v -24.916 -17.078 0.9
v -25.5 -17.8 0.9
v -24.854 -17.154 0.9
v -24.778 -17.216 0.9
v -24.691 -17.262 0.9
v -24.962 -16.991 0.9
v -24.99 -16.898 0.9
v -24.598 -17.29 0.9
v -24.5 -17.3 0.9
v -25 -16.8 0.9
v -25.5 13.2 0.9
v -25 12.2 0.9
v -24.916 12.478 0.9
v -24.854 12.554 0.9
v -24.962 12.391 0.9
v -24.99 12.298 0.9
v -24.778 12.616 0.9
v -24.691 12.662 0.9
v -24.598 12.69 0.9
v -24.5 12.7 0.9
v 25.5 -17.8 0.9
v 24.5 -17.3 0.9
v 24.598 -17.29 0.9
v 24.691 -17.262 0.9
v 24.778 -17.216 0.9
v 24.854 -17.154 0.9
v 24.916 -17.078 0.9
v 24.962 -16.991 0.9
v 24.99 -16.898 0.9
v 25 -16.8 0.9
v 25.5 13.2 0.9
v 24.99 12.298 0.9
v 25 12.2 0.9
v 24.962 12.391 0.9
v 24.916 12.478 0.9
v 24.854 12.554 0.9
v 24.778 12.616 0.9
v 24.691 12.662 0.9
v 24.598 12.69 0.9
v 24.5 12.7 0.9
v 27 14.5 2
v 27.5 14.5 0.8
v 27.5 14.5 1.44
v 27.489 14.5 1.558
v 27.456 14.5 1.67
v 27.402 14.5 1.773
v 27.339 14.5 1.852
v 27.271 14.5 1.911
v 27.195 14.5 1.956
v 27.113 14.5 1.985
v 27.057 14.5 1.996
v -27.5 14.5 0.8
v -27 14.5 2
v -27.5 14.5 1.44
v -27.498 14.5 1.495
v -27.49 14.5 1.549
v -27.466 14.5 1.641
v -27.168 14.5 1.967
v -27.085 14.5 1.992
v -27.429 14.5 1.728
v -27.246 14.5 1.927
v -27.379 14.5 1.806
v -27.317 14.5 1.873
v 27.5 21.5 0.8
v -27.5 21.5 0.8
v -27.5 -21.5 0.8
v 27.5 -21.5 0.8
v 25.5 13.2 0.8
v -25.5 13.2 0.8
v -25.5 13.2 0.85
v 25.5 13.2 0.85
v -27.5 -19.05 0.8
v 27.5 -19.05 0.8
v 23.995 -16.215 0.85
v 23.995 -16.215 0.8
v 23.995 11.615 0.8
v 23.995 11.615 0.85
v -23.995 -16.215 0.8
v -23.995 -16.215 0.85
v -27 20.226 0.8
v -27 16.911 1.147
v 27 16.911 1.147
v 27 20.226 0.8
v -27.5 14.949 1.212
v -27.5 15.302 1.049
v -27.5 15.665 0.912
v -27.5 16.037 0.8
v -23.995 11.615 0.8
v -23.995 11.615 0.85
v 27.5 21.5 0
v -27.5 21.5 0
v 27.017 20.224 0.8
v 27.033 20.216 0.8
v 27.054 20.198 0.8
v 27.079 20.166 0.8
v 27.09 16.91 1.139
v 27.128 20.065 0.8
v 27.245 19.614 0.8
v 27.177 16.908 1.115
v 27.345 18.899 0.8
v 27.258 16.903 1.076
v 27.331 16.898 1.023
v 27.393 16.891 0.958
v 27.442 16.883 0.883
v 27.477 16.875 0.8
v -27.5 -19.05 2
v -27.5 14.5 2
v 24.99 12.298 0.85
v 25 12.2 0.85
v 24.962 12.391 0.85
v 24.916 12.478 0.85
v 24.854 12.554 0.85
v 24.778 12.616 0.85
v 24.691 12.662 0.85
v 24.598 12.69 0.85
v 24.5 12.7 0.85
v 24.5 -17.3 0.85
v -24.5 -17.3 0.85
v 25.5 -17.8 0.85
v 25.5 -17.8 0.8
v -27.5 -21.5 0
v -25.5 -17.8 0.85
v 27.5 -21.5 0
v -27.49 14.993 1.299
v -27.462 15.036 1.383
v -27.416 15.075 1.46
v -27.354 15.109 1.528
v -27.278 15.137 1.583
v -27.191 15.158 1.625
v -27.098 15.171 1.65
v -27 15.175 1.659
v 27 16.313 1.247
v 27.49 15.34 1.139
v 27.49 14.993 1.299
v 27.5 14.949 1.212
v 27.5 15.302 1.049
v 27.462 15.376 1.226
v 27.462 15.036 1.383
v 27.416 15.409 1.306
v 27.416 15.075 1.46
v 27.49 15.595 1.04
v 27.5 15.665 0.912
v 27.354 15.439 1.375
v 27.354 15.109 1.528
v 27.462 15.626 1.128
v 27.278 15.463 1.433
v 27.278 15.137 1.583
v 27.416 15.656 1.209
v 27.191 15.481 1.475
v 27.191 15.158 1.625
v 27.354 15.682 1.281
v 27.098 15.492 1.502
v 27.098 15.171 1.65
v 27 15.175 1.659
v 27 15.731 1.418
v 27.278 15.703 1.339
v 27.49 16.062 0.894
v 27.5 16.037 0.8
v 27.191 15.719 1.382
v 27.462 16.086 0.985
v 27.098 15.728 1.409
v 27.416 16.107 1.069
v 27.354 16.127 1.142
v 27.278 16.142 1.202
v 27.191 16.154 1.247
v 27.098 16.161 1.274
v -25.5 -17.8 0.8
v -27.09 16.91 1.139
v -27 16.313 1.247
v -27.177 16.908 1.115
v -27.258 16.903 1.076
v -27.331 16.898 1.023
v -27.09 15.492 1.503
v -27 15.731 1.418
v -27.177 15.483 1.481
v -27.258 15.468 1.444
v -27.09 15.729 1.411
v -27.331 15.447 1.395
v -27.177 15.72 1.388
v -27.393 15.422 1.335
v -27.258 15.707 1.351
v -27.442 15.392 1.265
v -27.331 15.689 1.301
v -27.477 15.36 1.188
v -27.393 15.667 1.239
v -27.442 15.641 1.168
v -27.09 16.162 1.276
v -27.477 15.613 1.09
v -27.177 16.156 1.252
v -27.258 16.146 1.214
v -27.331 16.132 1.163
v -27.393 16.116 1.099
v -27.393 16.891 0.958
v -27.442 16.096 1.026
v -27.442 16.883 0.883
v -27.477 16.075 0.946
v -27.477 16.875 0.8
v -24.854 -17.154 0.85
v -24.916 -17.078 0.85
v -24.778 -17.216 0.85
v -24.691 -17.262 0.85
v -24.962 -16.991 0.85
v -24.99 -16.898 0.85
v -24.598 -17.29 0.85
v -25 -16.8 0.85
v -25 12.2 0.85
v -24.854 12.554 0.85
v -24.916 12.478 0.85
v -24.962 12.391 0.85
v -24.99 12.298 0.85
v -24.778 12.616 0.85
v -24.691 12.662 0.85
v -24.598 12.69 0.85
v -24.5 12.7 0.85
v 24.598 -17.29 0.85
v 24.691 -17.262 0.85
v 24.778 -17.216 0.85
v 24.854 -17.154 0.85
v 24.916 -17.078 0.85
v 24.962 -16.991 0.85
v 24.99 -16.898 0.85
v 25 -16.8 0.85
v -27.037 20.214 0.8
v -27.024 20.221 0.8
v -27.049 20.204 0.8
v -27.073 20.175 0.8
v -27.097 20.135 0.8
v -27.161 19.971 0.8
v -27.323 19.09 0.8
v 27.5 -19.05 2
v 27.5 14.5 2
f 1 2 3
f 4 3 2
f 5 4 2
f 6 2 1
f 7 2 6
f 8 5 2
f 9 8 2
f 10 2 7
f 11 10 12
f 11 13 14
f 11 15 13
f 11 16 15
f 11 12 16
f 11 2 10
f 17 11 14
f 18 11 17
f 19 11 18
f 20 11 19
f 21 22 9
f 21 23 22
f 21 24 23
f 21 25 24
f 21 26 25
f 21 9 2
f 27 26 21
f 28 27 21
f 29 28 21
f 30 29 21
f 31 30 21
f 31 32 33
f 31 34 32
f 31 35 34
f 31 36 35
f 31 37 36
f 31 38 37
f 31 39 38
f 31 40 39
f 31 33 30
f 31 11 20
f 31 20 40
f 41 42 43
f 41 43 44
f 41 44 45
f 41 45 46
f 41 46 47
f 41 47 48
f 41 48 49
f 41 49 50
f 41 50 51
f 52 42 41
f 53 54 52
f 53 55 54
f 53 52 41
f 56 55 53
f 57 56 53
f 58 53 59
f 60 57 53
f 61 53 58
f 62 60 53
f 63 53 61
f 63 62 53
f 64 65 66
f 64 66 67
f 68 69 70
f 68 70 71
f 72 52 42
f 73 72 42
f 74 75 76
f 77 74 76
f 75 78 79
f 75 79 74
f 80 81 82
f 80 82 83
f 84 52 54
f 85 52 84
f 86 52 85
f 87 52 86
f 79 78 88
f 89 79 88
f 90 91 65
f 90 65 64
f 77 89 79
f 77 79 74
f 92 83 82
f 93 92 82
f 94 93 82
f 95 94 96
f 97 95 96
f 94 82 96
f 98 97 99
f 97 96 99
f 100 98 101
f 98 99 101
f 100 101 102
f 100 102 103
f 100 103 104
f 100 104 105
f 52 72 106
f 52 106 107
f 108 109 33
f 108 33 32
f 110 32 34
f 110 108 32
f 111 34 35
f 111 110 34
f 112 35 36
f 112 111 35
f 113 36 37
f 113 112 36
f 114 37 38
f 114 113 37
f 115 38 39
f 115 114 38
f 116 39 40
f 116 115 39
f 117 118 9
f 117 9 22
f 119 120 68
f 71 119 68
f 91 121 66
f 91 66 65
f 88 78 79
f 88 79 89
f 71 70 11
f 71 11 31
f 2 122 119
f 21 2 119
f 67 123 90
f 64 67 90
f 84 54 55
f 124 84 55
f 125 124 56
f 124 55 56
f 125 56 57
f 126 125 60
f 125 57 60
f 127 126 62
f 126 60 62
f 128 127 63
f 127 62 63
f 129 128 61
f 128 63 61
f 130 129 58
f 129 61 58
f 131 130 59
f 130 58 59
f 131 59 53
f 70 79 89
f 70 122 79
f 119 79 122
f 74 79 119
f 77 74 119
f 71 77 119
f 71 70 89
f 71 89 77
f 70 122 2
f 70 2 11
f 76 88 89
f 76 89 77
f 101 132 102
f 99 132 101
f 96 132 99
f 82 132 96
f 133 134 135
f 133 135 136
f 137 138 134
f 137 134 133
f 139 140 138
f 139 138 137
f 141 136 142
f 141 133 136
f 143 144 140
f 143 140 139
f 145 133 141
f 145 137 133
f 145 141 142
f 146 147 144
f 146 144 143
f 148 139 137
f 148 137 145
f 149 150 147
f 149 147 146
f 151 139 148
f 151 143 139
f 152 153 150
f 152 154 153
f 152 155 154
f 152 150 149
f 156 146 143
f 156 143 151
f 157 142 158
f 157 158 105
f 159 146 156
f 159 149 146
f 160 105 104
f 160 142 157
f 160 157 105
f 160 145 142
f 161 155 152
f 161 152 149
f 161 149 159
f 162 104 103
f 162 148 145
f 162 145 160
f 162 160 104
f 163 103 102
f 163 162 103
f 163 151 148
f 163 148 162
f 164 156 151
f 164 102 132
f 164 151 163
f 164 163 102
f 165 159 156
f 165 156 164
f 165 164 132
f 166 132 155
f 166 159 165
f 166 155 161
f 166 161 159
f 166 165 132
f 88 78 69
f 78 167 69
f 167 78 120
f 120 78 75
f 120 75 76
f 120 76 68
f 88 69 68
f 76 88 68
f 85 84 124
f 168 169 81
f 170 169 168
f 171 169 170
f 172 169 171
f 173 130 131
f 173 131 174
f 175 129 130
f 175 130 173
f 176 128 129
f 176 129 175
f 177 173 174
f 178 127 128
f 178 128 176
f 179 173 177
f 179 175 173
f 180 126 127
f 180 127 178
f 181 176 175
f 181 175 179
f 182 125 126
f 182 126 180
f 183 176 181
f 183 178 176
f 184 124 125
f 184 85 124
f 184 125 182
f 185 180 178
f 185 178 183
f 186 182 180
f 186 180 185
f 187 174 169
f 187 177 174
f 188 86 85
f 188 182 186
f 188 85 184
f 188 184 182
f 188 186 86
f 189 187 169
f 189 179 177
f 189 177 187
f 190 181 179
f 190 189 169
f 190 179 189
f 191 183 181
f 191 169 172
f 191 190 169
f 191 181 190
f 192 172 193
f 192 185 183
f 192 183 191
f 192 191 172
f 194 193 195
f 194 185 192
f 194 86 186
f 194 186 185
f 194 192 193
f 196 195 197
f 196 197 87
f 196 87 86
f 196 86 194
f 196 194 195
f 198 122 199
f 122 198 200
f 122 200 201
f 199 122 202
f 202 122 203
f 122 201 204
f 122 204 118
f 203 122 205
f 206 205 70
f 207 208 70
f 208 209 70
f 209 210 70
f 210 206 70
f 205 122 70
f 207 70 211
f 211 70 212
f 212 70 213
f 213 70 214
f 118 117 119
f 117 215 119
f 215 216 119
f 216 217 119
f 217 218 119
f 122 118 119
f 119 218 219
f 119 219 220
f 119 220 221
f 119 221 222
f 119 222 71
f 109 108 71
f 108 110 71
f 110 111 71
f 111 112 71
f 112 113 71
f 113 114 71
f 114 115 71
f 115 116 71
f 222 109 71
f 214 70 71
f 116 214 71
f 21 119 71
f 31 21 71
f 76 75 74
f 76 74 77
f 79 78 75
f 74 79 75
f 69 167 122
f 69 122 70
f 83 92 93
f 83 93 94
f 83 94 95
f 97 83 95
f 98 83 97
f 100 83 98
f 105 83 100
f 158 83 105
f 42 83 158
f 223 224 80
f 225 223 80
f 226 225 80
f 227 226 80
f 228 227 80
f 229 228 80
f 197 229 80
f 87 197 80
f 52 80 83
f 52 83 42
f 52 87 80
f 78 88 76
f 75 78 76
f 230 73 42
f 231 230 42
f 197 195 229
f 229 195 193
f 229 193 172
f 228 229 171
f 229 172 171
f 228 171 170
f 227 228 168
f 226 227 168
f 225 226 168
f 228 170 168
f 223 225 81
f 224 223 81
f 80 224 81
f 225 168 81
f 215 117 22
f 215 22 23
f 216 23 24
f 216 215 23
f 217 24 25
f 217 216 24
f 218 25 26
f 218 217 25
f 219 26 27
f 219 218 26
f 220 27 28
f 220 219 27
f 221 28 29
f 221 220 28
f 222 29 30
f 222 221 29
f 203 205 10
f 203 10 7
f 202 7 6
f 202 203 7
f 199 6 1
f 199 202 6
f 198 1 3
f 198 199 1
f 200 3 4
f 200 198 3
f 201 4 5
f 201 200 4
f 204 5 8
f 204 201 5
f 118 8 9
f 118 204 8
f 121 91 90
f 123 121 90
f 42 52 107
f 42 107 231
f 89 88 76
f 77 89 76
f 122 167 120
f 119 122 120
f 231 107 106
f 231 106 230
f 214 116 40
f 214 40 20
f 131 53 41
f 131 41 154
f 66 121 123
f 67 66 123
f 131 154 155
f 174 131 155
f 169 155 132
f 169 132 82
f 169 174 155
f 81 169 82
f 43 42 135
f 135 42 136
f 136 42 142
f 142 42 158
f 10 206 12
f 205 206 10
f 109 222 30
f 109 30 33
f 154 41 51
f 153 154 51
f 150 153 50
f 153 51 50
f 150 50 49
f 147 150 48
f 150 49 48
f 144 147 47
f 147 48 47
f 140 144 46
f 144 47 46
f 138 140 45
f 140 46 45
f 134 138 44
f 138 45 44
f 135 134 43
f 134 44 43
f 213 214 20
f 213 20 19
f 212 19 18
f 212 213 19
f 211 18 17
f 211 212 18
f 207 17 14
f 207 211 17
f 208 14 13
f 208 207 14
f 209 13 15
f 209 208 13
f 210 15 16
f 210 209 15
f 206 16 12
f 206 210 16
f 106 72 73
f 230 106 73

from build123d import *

# Parameters (mm, degrees)
SKETCH1_W           = 55
SKETCH1_H           = 43
GLASSBASE_DEPTH     = 0.8
SKETCH3_W           = 51
SKETCH3_H           = 31
SKETCH3_W_2         = 47.99
SKETCH3_H_2         = 27.83
BOSS_EXTRUDE3_DEPTH = 0.05
SKETCH4_W           = 47.99
SKETCH4_H           = 27.83
BOSS_EXTRUDE4_DEPTH = 0.05
SKETCH5_W           = 51
SKETCH5_H           = 31
BOSS_EXTRUDE5_DEPTH = 0.05
SKETCH6_W           = 55
SKETCH6_H           = 33.55
BOSS_EXTRUDE6_DEPTH = 1.2
BOSS_EXTRUDE7_DEPTH = 55
FILLET1_R           = 0.5
FILLET2_R           = 0.5


with BuildPart() as part:
    # Sketch1 → GlassBase (new body)
    with BuildSketch(Plane.XY):
        Rectangle(SKETCH1_W, SKETCH1_H)
    extrude(amount=GLASSBASE_DEPTH)


with BuildPart() as body_2:
    # Sketch3 → Boss-Extrude3 (new body)
    with BuildSketch(Plane.XY.offset(0.8)):
        with Locations((0, -2.3)):
            Rectangle(SKETCH3_W, SKETCH3_H)
        with Locations((0, -2.3)):
            Rectangle(SKETCH3_W_2, SKETCH3_H_2, mode=Mode.SUBTRACT)
    extrude(amount=BOSS_EXTRUDE3_DEPTH)


with BuildPart() as body_3:
    # Sketch4 → Boss-Extrude4 (new body)
    with BuildSketch(Plane.XY.offset(0.8)):
        with Locations((0, -2.3)):
            Rectangle(SKETCH4_W, SKETCH4_H)
    extrude(amount=BOSS_EXTRUDE4_DEPTH)


with BuildPart() as body_4:
    # Sketch5 → Boss-Extrude5 (new body)
    with BuildSketch(Plane.XY.offset(0.85)):
        with Locations((0, -2.3)):
            Rectangle(SKETCH5_W, SKETCH5_H)
        with BuildLine():
            Line((-24.5, -17.3), (24.5, -17.3))
            ThreePointArc((24.5, -17.3), (24.853553391, -17.153553391), (25, -16.8))
            Line((25, -16.8), (25, 12.2))
            ThreePointArc((25, 12.2), (24.853553391, 12.553553391), (24.5, 12.7))
            Line((24.5, 12.7), (-24.5, 12.7))
            ThreePointArc((-24.5, 12.7), (-24.853553391, 12.553553391), (-25, 12.2))
            Line((-25, 12.2), (-25, -16.8))
            ThreePointArc((-25, -16.8), (-24.853553391, -17.153553391), (-24.5, -17.3))
        make_face(mode=Mode.SUBTRACT)
    extrude(amount=BOSS_EXTRUDE5_DEPTH)


with BuildPart() as body_5:
    # Sketch6 → Boss-Extrude6 (new body)
    with BuildSketch(Plane.XY.offset(0.8)):
        with Locations((0, -2.275)):
            Rectangle(SKETCH6_W, SKETCH6_H)
    extrude(amount=BOSS_EXTRUDE6_DEPTH)


with BuildPart() as body_6:
    # Sketch8 → Boss-Extrude7 (new body)
    with BuildSketch(Plane(origin=(-27.5, 14.5, 0.8), x_dir=(0, 0, 1), z_dir=(-1, 0, 0))):
        with BuildLine():
            Line((1.2, 0), (0.85856266, 0.674949192))
            ThreePointArc((0.85856266, 0.674949192), (0.523785891, 1.519615538), (0.347392821, 2.410919194))
            Line((0.347392821, 2.410919194), (0, 5.726486174))
            Line((0, 5.726486174), (0, 0))
            Line((0, 0), (1.2, 0))
        make_face()
    extrude(amount=-BOSS_EXTRUDE7_DEPTH)

    # Fillet1
    # the kernel refuses this fillet: 0.5 mm, written as the material it takes off along each edge
    with BuildSketch(Plane(origin=(-27.5, 16.910919194, 1.147392821), x_dir=(1, 0, 0), z_dir=(0, 0.994555748839717, -0.10420586571719334))) as fillet1_piece_1:
        with BuildLine():
            CenterArc((FILLET1_R, FILLET1_R), FILLET1_R, 180, 90)
            Line((0, FILLET1_R), (0, 0))
            Line((0, 0), (FILLET1_R, 0))
        make_face()
    extrude(amount=4.58371657, mode=Mode.SUBTRACT)
    with BuildSketch(Plane(origin=(-27.5, 17.431948523, 6.120171565), x_dir=(0, -0.45139986612381766, -0.8923217810091826), z_dir=(0, -0.8923217810091826, 0.45139986612381766))) as fillet1_piece_2:
        with BuildLine():
            CenterArc((5 + FILLET1_R, FILLET1_R), FILLET1_R, 180, 90)
            Line((5 + FILLET1_R, 0), (5, 0))
            Line((5, 0), (5, FILLET1_R))
        make_face()
    revolve(axis=Axis((-27.5, 17.431948523, 6.120171565), (1, 0, 0)), revolution_arc=20.852118409, mode=Mode.SUBTRACT)
    with BuildSketch(Plane(origin=(-27.5, 13.384597774, 2.564249833), x_dir=(1, 0, 0), z_dir=(0, 0.8923217810091835, -0.4513998661238159))) as fillet1_piece_3:
        with BuildLine():
            CenterArc((FILLET1_R, FILLET1_R), FILLET1_R, 180, 90)
            Line((0, FILLET1_R), (0, 0))
            Line((0, 0), (FILLET1_R, 0))
        make_face()
    extrude(amount=2.006396635, mode=Mode.SUBTRACT)

    # Fillet2
    # the kernel refuses this fillet: 0.5 mm, written as the material it takes off along each edge
    with BuildSketch(Plane(origin=(27.5, 17.431948523, 6.120171565), x_dir=(0, -0.45139986612381766, -0.8923217810091826), z_dir=(0, -0.8923217810091826, 0.45139986612381766))) as fillet2_piece_1:
        with BuildLine():
            CenterArc((5 + FILLET2_R, -FILLET2_R), FILLET2_R, 90, 90)
            Line((5 + FILLET2_R, 0), (5, 0))
            Line((5, 0), (5, -FILLET2_R))
        make_face()
    revolve(axis=Axis((27.5, 17.431948523, 6.120171565), (1, 0, 0)), revolution_arc=20.852118409, mode=Mode.SUBTRACT)
    with BuildSketch(Plane(origin=(27.5, 16.910919194, 1.147392821), x_dir=(0, -0.10420586571719336, -0.9945557488397171), z_dir=(0, 0.994555748839717, -0.10420586571719334))) as fillet2_piece_2:
        with BuildLine():
            CenterArc((FILLET2_R, FILLET2_R), FILLET2_R, 180, 90)
            Line((0, FILLET2_R), (0, 0))
            Line((0, 0), (FILLET2_R, 0))
        make_face()
    extrude(amount=4.58371657, mode=Mode.SUBTRACT)
    with BuildSketch(Plane(origin=(27.5, 13.384597774, 2.564249833), x_dir=(-1, 0, 0), z_dir=(0, 0.8923217810091835, -0.4513998661238159))) as fillet2_piece_3:
        with BuildLine():
            CenterArc((FILLET2_R, -FILLET2_R), FILLET2_R, 90, 90)
            Line((0, -FILLET2_R), (0, 0))
            Line((0, 0), (FILLET2_R, 0))
        make_face()
    extrude(amount=2.006396635, mode=Mode.SUBTRACT)


solid = Compound([part.part, body_2.part, body_3.part, body_4.part, body_5.part, body_6.part])
